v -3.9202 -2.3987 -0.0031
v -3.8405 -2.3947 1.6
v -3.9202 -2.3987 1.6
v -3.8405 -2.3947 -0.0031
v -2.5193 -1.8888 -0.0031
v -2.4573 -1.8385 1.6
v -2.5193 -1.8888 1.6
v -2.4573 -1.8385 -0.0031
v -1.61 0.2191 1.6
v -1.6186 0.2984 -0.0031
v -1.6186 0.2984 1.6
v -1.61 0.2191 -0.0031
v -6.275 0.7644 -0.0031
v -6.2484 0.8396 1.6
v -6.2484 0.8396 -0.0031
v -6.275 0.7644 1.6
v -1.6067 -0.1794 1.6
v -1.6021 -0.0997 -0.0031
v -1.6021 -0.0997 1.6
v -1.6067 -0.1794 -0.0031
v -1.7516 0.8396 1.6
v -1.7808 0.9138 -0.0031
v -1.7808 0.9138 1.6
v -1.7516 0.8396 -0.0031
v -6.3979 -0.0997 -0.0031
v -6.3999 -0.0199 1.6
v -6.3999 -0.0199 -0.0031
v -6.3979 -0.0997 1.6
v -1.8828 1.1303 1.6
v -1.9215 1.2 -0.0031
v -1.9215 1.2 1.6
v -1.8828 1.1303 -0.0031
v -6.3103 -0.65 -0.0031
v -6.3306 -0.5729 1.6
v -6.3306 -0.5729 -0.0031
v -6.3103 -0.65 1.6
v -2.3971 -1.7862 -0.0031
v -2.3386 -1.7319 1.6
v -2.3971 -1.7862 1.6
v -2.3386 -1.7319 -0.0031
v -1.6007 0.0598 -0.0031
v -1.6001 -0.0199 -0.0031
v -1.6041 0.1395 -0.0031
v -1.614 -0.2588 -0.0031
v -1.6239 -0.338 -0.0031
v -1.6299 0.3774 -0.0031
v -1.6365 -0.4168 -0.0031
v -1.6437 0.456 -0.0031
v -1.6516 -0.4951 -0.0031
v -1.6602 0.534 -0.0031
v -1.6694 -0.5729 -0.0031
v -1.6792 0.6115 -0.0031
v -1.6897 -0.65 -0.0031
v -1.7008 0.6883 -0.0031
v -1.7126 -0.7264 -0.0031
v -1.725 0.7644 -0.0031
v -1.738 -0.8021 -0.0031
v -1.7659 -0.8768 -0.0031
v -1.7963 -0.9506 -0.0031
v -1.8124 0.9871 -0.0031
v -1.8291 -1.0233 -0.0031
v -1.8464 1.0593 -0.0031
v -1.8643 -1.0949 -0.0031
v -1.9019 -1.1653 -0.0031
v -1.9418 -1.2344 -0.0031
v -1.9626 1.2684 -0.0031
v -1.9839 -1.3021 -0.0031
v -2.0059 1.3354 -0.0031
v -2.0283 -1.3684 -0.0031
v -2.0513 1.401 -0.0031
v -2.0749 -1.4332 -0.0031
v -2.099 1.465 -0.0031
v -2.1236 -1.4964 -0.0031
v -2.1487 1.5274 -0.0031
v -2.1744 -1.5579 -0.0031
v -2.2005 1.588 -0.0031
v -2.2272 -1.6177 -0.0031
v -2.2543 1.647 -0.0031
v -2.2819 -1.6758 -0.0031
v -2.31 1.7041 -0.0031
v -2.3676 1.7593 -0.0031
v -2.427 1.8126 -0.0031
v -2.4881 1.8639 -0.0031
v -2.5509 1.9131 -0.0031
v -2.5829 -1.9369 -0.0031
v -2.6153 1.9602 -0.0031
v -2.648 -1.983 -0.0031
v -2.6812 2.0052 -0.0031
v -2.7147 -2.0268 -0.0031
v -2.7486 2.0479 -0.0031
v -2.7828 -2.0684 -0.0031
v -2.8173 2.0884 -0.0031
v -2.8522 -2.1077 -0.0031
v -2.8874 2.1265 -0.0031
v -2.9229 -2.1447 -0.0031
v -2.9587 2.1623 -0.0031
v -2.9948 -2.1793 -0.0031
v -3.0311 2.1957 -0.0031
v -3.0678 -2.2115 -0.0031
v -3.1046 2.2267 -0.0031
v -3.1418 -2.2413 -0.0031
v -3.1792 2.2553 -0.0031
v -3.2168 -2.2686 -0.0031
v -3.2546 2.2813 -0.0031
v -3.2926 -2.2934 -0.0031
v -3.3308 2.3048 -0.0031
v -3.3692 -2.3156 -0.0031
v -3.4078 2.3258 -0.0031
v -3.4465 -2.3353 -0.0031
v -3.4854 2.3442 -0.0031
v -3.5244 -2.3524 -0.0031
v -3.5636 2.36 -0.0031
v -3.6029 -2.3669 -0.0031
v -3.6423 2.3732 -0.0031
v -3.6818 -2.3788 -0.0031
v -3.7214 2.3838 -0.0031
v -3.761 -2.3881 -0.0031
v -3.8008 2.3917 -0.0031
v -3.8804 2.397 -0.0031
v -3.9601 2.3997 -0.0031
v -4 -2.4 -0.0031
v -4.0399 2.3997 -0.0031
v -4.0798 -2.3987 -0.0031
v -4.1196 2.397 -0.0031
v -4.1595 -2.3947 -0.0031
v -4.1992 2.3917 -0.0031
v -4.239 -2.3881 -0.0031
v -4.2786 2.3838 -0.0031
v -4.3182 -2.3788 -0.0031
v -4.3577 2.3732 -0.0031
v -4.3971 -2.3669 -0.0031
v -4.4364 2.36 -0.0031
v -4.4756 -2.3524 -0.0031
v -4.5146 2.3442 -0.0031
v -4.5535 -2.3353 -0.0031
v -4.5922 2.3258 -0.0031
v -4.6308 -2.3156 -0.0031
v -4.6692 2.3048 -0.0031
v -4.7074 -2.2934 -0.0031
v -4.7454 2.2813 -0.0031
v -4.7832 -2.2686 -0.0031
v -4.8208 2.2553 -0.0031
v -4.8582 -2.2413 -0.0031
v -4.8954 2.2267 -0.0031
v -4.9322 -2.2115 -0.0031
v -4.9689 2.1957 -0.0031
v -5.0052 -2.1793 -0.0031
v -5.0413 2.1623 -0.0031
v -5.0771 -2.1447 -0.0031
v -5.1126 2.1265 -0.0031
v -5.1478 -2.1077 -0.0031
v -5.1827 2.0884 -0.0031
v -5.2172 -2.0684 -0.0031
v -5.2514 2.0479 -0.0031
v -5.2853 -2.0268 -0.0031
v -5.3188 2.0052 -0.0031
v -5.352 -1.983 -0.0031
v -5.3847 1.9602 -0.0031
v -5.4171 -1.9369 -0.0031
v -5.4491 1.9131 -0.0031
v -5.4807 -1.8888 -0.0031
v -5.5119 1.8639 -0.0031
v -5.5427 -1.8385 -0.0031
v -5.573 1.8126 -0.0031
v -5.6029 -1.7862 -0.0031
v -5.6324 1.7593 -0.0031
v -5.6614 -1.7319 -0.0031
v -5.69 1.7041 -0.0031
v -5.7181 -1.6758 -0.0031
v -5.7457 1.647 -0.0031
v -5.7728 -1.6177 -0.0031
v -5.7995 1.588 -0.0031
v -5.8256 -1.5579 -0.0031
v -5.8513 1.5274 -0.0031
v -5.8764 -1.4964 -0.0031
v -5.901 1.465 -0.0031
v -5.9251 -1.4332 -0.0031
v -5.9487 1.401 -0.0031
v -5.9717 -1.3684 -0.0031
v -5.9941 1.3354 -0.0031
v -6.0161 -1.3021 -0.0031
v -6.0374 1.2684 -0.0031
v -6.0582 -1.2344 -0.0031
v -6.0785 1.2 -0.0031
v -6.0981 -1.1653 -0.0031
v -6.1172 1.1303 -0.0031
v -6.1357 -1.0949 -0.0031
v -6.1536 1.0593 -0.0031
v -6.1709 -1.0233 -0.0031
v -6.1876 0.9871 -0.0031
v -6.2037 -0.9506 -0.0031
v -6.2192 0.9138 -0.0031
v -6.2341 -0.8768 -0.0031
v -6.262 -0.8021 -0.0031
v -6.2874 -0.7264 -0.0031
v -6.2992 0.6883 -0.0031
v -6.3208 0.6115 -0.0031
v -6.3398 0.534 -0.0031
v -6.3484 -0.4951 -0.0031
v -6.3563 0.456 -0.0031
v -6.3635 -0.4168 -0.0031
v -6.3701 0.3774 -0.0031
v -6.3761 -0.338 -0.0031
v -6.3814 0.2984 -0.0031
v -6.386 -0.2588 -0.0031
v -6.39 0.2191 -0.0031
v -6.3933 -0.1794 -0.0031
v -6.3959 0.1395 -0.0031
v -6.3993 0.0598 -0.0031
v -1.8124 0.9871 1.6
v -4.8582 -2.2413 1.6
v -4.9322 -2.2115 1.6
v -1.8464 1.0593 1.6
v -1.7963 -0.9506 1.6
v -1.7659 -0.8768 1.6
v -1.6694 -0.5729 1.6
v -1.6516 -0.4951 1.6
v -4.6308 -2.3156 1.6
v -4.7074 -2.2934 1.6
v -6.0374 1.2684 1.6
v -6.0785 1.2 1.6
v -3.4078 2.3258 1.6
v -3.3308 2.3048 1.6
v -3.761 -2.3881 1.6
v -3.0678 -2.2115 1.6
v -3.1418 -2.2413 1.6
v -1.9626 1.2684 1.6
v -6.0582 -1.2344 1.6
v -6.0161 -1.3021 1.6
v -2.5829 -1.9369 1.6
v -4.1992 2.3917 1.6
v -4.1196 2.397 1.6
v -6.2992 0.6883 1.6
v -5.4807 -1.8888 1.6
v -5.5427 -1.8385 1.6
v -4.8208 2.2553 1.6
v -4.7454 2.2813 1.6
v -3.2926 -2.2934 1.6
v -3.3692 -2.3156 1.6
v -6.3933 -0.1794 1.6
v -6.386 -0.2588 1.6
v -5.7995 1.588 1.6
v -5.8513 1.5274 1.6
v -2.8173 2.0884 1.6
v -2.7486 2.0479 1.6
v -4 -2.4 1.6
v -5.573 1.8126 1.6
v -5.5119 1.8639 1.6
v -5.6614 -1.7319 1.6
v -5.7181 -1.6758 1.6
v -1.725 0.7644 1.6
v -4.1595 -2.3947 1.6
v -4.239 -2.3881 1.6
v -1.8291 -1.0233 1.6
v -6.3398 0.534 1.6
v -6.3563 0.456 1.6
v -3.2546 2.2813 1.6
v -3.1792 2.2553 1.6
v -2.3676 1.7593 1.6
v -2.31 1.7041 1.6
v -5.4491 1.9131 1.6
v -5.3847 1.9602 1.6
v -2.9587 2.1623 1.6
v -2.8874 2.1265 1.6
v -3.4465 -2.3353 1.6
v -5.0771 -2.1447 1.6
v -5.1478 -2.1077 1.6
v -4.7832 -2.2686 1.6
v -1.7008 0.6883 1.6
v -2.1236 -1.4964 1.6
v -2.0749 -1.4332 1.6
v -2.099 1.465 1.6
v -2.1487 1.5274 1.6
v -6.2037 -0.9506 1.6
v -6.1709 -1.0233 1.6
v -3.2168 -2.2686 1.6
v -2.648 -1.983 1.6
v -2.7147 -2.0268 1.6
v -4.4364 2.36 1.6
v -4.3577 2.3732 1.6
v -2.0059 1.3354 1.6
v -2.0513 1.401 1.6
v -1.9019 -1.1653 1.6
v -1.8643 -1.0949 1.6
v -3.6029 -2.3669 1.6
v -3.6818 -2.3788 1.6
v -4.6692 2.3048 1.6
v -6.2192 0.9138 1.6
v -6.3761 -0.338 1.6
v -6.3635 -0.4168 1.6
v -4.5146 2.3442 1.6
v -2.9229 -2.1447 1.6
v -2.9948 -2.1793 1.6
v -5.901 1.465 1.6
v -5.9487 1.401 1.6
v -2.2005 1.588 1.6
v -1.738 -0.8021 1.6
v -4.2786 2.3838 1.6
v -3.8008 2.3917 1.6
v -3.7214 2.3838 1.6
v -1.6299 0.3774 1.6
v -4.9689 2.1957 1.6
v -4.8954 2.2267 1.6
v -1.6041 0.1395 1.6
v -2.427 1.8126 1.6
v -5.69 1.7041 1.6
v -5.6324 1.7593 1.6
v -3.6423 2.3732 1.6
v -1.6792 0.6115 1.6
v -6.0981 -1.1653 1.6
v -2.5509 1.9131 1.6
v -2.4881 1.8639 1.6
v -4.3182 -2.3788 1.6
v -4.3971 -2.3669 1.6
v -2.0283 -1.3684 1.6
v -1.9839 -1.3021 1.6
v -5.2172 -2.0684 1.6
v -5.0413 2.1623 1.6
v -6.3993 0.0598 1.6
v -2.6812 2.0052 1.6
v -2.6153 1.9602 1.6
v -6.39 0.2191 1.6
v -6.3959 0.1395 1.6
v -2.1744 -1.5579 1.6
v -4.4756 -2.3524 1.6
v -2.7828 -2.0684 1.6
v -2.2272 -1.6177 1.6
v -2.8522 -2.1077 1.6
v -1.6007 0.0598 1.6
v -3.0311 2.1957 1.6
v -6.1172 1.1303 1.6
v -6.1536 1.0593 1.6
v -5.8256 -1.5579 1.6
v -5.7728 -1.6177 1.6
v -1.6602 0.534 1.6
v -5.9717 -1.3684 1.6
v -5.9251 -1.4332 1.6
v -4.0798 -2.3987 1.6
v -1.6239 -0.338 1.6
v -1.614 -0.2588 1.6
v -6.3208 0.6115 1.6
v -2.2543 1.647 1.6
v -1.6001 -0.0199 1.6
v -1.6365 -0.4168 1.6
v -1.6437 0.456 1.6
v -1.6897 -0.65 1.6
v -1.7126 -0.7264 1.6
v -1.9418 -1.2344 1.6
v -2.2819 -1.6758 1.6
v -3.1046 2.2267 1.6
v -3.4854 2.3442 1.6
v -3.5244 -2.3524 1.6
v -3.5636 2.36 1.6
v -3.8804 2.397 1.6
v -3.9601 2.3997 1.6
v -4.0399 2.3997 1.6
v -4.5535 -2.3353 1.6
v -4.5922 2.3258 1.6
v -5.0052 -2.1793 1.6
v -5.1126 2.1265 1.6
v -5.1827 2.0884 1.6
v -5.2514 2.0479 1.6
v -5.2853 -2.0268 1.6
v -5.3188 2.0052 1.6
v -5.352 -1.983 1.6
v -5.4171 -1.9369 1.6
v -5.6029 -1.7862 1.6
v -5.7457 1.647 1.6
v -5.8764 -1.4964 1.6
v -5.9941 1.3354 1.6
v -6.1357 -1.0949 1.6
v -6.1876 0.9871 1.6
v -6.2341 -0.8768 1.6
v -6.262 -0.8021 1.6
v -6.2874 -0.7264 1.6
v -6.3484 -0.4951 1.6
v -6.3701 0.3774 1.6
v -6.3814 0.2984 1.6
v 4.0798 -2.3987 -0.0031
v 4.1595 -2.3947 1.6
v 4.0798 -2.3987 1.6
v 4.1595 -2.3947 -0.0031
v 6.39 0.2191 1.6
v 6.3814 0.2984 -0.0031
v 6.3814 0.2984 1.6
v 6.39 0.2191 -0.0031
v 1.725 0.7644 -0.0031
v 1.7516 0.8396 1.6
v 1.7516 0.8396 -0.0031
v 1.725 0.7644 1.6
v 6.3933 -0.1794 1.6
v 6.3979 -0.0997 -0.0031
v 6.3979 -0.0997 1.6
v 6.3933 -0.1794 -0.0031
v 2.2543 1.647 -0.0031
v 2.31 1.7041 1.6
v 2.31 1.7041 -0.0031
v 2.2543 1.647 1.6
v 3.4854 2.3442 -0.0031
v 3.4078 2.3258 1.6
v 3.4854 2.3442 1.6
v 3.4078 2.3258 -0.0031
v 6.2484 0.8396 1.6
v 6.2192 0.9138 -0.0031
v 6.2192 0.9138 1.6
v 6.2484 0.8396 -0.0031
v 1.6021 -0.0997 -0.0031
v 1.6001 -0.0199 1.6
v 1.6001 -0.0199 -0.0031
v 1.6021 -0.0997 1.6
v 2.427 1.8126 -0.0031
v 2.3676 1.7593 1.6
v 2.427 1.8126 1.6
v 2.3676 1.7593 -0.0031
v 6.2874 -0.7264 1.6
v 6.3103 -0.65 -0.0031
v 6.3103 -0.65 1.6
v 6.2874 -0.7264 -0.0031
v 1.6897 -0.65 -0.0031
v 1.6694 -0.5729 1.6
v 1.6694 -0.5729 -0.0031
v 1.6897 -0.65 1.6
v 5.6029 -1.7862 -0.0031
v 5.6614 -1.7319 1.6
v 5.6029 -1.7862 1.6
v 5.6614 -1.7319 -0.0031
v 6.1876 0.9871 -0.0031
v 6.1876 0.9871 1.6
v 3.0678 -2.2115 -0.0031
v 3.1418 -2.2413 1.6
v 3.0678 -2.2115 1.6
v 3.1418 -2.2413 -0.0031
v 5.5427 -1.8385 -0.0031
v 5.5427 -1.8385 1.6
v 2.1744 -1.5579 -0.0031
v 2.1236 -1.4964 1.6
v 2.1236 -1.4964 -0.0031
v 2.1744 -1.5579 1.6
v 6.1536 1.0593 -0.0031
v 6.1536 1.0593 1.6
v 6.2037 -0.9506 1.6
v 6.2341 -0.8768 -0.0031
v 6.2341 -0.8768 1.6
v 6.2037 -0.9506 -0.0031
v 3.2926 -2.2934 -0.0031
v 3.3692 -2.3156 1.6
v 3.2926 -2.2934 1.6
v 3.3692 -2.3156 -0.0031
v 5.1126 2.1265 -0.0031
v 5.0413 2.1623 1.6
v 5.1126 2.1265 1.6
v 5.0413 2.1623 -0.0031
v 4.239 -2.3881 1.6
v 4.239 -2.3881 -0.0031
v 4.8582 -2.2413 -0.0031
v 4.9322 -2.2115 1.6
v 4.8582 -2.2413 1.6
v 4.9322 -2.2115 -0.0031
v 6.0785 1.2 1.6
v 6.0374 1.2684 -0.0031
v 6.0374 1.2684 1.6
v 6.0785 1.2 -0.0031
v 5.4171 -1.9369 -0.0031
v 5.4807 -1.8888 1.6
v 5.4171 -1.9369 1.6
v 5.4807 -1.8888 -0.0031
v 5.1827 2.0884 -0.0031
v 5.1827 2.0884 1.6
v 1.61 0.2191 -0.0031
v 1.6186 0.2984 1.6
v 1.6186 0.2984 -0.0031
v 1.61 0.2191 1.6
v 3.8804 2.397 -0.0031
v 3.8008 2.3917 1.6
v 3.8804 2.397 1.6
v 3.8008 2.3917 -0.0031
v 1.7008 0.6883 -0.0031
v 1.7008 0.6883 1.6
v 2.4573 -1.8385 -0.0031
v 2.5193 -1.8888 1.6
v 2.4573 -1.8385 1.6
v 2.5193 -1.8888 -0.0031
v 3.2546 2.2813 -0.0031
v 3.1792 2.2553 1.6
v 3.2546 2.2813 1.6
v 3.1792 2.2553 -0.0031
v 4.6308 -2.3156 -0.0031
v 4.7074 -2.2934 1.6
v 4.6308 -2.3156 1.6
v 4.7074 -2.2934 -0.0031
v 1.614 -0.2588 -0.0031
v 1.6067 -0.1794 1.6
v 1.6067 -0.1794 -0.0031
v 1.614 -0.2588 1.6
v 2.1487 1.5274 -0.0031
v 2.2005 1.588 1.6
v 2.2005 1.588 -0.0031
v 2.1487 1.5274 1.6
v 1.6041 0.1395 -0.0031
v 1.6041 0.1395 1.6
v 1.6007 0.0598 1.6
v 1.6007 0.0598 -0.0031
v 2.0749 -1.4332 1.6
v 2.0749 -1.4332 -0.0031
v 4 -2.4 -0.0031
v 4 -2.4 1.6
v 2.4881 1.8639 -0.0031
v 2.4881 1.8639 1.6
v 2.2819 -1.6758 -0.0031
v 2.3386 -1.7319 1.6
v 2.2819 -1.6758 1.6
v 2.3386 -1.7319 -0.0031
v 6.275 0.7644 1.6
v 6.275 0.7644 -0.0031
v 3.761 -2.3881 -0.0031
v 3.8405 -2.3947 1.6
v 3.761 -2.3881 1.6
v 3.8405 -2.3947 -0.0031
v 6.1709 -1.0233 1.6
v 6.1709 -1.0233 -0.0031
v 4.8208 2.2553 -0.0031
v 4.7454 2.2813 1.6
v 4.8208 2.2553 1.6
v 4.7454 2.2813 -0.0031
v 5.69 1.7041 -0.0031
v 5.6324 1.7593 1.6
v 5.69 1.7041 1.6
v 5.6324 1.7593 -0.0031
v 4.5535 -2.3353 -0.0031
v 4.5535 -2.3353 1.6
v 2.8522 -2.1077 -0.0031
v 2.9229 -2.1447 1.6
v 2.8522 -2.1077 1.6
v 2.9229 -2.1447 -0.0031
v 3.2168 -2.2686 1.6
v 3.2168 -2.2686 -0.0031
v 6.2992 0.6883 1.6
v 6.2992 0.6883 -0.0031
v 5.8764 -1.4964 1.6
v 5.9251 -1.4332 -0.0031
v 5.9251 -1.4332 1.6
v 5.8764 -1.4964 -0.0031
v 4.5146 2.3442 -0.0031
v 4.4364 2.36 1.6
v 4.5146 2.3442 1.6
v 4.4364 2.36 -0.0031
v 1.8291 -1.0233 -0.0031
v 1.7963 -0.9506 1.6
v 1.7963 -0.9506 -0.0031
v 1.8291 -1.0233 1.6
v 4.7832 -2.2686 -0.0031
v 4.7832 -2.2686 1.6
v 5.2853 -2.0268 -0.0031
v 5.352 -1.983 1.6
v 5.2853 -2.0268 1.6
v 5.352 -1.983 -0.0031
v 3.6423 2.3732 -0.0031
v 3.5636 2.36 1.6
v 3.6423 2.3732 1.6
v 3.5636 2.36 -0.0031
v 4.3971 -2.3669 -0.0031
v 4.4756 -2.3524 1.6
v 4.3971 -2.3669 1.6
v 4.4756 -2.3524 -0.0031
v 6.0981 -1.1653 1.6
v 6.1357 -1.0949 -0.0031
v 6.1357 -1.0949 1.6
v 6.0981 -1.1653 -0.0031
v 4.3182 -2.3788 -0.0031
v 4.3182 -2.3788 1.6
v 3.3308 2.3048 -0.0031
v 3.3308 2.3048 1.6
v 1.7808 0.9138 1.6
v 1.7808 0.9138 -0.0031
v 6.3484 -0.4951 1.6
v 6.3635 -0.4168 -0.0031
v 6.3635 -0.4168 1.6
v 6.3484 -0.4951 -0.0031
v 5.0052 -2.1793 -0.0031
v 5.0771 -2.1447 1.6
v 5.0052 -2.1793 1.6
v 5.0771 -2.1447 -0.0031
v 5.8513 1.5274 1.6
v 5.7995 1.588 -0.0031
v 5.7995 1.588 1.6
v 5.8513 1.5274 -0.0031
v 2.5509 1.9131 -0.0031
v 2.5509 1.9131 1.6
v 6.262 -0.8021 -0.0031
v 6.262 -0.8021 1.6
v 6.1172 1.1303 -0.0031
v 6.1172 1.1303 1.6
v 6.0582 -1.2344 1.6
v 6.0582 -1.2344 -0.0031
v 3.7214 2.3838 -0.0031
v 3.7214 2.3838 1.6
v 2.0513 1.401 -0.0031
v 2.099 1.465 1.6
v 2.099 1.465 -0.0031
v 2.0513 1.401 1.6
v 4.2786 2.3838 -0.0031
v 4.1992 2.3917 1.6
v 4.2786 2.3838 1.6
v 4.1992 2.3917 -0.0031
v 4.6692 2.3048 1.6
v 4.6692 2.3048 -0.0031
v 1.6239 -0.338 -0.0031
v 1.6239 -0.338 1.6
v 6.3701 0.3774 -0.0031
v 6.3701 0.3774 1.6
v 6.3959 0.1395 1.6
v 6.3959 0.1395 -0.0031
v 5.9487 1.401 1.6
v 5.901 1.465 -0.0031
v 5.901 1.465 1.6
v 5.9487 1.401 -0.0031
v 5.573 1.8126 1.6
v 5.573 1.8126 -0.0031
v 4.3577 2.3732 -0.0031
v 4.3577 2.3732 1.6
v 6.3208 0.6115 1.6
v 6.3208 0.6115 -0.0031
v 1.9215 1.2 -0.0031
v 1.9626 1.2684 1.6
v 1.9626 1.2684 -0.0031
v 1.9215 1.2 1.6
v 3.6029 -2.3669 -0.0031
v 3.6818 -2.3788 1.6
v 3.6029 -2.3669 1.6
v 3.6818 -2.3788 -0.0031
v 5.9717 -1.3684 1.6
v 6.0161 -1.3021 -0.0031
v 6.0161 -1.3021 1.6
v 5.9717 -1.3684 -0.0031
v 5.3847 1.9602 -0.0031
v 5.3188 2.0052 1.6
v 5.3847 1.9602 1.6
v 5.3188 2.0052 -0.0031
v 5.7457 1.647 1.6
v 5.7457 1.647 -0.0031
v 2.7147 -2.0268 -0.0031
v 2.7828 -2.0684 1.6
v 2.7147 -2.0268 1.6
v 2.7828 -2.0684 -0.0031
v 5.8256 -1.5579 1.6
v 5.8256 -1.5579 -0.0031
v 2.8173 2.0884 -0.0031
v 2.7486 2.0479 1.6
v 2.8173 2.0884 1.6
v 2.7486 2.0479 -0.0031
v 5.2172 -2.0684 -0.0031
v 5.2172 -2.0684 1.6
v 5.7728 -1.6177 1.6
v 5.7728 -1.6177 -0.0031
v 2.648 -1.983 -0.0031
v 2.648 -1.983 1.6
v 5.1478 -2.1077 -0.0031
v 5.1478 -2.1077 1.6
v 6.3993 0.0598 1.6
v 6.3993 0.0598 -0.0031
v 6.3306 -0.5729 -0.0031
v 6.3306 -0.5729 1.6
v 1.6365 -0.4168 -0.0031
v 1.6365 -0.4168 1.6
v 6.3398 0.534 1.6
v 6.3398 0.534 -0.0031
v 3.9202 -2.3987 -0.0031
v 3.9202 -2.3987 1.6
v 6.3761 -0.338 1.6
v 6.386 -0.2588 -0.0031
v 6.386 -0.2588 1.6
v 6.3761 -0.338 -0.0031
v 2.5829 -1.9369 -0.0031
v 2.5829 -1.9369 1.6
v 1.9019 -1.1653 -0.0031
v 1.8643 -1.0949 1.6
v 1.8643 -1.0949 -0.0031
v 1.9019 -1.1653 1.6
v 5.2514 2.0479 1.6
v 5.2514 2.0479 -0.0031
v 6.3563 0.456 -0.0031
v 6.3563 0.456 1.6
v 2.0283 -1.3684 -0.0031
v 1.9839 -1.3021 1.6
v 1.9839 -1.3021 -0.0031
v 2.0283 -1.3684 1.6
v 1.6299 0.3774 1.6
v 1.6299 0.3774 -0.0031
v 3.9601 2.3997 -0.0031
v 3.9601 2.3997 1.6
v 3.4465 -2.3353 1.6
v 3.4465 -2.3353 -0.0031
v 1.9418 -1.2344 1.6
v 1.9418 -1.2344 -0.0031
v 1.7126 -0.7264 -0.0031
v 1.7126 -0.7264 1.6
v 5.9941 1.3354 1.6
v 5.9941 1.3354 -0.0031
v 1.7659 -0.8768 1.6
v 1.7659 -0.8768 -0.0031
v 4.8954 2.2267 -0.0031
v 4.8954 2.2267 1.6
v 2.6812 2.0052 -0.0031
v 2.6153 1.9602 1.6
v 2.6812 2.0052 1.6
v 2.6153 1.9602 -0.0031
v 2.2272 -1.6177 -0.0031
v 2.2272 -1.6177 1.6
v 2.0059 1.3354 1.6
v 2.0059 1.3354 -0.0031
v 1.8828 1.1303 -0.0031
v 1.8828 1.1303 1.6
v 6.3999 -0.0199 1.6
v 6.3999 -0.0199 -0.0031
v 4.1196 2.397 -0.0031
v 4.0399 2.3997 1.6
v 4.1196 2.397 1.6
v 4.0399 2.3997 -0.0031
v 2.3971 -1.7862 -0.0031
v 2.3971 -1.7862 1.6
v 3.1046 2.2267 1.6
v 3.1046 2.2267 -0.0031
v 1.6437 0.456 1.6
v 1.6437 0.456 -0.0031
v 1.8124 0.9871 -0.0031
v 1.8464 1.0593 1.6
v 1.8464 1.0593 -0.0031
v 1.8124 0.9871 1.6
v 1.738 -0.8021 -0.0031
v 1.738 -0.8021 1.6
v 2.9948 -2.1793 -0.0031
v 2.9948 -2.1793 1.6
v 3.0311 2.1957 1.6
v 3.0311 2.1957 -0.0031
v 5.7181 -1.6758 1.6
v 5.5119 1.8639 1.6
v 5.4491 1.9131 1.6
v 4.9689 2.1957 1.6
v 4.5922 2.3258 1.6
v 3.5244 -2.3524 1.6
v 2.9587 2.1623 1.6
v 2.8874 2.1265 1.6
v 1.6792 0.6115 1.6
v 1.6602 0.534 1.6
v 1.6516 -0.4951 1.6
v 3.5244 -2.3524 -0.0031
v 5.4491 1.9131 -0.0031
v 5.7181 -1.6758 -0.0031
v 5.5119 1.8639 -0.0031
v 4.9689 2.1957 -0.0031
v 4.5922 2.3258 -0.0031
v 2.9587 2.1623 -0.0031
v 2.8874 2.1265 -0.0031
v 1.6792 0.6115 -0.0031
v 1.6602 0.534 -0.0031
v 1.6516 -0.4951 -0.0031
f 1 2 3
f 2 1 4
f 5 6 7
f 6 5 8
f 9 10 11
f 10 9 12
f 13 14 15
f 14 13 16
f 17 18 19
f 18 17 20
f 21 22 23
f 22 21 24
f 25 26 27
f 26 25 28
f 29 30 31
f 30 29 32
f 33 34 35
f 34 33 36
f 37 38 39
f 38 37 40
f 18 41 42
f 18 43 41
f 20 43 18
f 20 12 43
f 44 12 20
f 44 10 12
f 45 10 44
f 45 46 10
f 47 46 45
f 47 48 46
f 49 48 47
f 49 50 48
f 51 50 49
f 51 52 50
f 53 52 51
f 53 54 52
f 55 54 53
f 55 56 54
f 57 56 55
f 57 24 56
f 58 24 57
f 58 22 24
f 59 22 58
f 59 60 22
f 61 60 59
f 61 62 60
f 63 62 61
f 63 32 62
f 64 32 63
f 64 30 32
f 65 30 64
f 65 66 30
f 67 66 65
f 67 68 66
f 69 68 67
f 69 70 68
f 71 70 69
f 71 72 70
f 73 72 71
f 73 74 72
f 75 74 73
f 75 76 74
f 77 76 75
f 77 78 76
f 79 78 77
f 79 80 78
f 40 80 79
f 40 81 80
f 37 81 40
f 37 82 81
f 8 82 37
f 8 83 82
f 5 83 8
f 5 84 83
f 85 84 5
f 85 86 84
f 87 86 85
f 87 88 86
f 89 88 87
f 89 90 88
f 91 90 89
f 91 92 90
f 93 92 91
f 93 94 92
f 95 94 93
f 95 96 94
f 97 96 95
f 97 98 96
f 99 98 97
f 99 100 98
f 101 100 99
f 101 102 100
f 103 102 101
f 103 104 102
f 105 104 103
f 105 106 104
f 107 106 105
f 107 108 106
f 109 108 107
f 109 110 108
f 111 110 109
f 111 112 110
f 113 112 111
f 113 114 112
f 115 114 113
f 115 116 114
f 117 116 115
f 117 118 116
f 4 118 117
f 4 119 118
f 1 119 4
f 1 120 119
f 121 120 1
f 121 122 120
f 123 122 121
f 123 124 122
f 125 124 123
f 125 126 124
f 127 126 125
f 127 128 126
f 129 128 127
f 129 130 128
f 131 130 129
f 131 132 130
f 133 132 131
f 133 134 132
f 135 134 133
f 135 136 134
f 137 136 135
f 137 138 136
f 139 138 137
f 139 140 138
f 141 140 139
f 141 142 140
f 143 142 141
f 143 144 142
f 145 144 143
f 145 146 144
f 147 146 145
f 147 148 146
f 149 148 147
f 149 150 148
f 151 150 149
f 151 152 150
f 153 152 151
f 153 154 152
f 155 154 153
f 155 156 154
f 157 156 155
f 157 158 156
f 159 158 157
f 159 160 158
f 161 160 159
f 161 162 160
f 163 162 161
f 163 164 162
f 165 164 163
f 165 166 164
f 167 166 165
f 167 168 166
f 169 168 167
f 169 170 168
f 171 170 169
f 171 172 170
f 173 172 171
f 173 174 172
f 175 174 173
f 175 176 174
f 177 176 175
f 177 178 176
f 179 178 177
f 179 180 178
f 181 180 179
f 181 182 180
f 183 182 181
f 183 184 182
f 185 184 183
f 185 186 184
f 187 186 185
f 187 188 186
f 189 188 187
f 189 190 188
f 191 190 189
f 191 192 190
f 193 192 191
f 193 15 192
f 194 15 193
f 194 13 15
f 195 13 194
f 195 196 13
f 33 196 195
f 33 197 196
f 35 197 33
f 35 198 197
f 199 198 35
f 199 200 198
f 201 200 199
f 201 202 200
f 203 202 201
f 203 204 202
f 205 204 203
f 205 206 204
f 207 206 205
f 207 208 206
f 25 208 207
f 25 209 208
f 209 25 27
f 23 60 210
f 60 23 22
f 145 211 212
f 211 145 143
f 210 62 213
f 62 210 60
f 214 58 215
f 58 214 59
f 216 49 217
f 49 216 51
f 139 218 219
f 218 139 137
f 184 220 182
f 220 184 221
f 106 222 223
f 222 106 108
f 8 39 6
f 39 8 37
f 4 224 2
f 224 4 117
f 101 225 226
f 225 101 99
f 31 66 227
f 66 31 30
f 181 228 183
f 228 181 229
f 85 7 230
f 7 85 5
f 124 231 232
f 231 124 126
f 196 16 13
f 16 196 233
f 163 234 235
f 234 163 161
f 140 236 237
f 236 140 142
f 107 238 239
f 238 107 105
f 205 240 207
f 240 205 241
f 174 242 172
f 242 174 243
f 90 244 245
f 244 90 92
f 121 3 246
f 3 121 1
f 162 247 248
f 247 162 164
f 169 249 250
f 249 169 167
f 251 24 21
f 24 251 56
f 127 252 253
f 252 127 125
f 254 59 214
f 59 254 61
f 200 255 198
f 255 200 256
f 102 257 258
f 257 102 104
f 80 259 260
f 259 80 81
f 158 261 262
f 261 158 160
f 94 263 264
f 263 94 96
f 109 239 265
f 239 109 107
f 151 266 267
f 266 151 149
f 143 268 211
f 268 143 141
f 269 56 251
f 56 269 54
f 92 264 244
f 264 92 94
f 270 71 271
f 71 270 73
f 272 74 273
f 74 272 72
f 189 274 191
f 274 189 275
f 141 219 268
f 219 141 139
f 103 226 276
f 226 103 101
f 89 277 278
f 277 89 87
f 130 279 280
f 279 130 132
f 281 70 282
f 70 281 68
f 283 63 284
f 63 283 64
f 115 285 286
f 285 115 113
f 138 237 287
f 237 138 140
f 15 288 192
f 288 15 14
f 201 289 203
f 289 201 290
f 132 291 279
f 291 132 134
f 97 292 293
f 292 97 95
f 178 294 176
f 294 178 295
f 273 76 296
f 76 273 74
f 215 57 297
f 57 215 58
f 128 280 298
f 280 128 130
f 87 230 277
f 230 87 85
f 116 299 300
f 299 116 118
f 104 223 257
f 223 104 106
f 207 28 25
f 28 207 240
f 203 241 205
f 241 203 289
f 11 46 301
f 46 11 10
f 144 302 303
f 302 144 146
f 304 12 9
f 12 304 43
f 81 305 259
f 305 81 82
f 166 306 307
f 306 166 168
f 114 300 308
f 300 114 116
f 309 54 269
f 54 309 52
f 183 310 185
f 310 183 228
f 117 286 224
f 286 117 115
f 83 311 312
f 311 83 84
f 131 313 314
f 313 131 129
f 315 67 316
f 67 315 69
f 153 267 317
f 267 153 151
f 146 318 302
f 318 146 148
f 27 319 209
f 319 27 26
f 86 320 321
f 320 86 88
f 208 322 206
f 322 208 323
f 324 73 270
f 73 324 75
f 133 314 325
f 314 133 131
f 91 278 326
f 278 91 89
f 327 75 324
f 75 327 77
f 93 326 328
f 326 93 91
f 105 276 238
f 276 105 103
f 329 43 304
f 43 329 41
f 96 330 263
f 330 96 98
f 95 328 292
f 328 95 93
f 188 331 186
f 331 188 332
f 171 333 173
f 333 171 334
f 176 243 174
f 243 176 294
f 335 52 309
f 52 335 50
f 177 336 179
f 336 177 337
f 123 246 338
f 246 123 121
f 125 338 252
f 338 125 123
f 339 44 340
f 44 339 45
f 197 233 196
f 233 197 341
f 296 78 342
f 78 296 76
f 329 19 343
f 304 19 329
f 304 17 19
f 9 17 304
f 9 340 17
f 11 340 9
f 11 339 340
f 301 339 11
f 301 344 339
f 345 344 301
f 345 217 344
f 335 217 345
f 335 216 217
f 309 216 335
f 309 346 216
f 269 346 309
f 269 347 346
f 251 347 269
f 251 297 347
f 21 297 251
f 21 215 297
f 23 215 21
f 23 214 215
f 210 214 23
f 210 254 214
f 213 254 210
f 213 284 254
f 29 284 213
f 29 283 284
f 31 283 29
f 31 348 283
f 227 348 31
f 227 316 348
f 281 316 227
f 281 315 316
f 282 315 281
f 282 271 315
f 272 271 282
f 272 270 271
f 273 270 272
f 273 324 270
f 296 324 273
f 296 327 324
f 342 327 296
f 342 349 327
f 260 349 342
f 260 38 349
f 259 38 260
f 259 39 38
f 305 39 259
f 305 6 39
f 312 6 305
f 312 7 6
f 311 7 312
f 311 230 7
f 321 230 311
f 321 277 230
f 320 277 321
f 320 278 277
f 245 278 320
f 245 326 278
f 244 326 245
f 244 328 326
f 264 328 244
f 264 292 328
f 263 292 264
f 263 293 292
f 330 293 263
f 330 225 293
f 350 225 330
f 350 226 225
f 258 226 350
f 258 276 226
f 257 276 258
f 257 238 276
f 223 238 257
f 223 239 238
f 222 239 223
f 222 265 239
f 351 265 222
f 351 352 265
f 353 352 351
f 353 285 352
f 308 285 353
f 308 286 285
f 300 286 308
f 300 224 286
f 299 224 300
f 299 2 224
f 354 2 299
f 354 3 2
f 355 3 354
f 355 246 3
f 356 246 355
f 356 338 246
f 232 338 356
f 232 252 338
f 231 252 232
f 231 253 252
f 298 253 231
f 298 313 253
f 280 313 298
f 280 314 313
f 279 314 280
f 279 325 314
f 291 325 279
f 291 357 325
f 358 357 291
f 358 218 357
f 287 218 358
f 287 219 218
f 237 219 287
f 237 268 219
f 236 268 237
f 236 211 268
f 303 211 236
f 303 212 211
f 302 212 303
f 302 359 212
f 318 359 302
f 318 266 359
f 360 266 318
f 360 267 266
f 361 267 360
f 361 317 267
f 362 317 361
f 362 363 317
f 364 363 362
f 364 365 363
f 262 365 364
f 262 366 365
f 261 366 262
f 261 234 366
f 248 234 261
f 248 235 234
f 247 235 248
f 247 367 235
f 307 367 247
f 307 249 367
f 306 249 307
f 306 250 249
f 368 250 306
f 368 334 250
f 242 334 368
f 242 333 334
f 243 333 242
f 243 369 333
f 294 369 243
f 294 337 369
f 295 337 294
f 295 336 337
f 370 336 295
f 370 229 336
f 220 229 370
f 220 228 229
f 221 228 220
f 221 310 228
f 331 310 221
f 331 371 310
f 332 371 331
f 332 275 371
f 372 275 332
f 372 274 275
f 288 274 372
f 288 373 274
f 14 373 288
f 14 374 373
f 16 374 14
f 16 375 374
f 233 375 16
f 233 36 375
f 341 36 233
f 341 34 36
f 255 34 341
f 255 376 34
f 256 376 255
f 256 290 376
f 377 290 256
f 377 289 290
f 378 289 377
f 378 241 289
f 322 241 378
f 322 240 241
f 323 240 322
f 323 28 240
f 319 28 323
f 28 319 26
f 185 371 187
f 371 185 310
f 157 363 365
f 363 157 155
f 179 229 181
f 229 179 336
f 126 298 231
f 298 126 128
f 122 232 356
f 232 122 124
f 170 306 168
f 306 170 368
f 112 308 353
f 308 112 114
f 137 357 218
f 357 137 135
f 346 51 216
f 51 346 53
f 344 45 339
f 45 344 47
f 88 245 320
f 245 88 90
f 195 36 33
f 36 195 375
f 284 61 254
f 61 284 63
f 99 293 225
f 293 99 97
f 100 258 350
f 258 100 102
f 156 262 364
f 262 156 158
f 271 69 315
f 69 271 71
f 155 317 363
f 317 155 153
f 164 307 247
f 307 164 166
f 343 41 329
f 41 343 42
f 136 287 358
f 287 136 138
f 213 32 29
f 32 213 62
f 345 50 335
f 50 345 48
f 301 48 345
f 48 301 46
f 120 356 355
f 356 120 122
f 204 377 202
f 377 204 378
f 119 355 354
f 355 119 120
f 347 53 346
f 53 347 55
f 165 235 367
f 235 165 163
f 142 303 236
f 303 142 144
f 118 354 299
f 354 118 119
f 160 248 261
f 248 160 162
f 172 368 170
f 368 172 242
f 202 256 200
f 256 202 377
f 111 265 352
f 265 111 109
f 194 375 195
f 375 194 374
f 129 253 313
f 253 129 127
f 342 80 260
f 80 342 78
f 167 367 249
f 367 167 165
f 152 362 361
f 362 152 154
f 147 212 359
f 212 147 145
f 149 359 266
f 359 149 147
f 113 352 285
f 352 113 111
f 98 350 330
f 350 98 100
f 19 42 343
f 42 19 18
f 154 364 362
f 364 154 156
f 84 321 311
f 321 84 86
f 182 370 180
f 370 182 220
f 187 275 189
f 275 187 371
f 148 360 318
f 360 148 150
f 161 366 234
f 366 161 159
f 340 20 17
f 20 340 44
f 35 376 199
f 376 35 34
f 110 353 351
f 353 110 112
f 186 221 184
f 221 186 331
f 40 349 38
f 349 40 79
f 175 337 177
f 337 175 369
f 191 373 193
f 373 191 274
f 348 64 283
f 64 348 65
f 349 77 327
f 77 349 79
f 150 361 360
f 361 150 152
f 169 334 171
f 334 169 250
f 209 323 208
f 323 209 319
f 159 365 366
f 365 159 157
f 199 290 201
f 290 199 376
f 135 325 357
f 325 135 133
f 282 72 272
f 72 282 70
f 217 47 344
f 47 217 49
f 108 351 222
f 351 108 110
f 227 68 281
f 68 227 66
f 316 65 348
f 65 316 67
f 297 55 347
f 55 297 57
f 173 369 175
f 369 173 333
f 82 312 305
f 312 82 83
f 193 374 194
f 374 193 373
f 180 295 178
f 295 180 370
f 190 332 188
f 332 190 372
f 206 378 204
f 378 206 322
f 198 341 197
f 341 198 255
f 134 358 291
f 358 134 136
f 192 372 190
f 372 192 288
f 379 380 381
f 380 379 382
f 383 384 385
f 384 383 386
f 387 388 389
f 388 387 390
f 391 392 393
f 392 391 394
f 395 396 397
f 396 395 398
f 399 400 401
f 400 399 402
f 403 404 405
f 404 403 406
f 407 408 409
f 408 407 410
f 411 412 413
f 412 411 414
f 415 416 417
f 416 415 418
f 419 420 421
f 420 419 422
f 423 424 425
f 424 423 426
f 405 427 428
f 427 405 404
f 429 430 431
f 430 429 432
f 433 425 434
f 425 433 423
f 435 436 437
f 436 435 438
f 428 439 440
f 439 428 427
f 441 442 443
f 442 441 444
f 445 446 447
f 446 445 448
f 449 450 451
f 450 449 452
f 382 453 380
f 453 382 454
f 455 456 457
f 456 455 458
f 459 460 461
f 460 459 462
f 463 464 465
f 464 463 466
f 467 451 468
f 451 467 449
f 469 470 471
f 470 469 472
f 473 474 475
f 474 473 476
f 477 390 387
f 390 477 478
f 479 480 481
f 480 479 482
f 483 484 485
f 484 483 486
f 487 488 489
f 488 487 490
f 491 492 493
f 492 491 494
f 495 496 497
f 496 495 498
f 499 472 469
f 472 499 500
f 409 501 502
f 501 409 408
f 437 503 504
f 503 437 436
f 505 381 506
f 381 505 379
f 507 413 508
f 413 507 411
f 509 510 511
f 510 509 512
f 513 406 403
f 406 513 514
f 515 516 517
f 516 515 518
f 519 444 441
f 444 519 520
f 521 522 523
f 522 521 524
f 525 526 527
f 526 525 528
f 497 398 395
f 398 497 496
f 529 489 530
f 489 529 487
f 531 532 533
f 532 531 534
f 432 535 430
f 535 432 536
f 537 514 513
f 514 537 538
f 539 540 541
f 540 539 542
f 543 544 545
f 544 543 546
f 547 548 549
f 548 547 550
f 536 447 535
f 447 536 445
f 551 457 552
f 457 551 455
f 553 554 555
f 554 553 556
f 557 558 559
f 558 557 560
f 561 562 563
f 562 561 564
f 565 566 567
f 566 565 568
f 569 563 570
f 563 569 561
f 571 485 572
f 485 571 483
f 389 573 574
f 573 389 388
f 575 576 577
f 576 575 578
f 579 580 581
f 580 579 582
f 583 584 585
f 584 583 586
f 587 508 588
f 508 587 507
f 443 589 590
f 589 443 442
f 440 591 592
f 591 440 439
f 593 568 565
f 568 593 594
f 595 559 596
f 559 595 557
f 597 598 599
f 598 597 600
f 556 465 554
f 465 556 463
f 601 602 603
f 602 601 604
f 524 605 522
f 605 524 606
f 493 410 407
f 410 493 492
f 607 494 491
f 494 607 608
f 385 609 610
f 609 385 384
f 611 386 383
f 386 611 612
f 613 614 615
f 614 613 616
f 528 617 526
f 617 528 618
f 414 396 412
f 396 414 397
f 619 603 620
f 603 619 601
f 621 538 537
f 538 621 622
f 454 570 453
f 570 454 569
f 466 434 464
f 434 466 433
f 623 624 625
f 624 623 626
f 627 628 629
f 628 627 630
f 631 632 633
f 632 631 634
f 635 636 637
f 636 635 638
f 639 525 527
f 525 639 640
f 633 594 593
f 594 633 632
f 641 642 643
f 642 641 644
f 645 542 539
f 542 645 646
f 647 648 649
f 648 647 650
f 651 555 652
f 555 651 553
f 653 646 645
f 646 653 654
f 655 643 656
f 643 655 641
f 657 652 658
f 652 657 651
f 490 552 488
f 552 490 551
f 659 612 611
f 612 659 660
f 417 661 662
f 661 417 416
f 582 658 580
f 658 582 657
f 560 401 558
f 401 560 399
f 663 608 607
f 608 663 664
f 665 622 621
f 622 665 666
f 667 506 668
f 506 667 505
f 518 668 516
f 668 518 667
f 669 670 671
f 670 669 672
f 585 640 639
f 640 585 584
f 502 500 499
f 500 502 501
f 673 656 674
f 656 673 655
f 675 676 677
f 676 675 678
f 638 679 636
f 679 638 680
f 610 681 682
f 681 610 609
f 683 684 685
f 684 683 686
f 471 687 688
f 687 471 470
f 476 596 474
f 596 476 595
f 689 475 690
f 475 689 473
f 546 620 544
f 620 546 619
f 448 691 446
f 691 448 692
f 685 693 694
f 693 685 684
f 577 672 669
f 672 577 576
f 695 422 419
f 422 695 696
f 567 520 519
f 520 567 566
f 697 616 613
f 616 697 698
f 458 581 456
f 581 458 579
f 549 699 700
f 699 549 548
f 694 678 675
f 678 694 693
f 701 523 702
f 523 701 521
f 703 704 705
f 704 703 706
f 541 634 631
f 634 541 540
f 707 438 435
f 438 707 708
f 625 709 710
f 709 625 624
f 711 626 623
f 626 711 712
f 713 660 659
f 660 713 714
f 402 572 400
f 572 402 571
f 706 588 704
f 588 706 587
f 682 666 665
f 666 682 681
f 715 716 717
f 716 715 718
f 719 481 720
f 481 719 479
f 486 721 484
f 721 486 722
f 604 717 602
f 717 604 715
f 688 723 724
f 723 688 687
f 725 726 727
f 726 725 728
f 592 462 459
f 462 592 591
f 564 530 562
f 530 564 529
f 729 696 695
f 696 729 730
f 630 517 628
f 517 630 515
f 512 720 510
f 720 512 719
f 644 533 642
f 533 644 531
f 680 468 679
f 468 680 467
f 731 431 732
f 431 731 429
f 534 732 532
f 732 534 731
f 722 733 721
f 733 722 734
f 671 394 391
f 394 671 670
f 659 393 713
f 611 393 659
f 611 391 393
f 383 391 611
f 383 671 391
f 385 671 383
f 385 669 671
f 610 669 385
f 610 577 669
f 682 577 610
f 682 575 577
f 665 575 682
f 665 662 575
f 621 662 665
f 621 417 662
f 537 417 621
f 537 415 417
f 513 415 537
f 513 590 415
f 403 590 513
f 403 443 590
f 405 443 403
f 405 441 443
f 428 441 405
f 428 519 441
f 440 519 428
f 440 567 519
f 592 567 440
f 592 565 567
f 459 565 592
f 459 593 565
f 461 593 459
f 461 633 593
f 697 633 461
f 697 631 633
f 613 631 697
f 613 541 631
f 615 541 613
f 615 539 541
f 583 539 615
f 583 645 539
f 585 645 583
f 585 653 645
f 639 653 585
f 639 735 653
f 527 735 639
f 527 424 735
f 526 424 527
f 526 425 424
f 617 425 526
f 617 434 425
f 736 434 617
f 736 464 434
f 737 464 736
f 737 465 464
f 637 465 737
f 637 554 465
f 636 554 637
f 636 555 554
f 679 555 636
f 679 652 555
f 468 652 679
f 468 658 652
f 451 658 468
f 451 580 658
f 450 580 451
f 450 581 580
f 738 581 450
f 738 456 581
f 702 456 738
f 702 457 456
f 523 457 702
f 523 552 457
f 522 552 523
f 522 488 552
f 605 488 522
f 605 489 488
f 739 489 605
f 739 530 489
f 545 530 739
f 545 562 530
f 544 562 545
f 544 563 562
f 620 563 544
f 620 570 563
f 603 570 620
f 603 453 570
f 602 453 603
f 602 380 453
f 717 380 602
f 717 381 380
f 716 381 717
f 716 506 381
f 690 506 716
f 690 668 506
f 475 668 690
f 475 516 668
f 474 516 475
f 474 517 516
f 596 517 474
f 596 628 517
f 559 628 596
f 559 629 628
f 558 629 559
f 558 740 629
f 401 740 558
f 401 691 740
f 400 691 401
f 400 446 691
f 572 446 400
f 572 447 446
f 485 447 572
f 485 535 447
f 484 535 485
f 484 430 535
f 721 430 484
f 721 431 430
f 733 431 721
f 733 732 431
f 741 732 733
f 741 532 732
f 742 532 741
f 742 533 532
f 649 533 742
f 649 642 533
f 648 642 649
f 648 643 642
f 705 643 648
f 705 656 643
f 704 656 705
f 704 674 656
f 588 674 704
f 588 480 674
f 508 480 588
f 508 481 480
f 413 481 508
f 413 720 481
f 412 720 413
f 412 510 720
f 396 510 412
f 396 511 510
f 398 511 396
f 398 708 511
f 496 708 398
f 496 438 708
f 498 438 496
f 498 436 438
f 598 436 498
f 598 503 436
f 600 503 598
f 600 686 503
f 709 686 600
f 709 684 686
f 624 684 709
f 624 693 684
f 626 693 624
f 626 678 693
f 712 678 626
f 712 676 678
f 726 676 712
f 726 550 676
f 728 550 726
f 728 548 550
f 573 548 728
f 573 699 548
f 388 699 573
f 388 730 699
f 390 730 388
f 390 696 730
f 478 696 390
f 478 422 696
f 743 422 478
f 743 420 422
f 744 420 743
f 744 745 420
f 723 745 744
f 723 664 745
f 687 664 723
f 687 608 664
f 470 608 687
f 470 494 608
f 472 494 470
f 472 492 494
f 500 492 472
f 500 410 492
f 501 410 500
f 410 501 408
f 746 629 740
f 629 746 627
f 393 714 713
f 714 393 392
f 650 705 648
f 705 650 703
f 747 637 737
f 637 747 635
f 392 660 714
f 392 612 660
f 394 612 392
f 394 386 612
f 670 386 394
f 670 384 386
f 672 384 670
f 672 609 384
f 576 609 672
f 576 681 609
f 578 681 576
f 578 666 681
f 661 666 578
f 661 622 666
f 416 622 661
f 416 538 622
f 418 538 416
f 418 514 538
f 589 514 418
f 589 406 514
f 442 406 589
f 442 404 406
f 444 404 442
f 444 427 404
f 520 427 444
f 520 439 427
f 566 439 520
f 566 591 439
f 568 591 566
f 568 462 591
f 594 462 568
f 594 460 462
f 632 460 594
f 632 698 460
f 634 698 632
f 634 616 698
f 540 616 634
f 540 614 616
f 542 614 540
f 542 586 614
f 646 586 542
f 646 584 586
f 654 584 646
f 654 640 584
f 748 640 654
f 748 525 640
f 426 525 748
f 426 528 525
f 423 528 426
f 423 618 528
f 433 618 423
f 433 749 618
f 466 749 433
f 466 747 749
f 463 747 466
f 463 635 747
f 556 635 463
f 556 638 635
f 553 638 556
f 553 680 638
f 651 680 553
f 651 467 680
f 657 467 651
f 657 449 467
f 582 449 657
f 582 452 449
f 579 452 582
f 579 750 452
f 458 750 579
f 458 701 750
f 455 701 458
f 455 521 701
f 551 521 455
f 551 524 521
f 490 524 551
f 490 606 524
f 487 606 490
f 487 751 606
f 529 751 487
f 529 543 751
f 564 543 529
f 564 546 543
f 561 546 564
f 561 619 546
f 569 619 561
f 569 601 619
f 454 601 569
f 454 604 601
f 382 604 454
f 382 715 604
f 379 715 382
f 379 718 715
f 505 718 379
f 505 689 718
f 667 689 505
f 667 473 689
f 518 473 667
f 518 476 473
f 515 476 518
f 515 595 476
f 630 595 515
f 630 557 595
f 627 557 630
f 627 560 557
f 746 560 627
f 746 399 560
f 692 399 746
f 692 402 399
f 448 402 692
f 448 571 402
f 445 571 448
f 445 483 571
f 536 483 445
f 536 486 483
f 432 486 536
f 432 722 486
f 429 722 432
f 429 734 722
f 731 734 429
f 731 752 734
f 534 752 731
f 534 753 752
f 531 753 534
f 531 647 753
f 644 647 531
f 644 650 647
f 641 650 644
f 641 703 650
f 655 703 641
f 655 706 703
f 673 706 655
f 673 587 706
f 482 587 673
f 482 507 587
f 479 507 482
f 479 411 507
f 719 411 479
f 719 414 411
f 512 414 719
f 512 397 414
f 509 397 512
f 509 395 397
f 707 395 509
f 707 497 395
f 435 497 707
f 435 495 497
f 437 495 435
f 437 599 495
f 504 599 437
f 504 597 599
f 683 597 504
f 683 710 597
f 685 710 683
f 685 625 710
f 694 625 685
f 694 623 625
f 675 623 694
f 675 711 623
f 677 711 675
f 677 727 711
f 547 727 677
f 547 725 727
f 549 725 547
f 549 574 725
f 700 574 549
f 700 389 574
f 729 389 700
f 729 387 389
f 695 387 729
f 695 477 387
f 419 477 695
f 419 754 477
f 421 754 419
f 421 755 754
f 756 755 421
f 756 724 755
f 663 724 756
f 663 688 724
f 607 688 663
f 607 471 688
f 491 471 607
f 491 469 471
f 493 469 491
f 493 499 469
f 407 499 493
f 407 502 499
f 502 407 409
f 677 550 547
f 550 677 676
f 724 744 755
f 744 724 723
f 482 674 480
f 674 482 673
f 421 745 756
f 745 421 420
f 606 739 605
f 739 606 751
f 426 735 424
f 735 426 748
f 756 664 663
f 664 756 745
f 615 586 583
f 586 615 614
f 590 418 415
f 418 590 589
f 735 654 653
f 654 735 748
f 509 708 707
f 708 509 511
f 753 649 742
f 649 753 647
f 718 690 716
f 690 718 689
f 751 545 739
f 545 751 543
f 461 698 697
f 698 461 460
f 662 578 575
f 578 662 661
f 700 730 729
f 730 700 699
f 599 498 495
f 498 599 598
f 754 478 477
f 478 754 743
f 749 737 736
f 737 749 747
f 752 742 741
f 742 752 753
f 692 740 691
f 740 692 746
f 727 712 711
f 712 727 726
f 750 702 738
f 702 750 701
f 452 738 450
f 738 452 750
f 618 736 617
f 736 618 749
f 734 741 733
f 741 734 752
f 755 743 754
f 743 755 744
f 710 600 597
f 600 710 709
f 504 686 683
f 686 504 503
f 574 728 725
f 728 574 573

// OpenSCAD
use <../lib.scad>
use <s/3039p08s02.scad>
use <s/3039s01.scad>
$fa=1; $fs=0.2;
function ldraw_lib__3039p08(realsolid=false) = [
// 0 Slope Brick 45  2 x  2 with Police Yellow Star Badge Pattern
// 0 Name: 3039p08.dat
// 0 Author: Michael Heidemann [mikeheide]
// 0 !LDRAW_ORG Part UPDATE 2019-01
// 0 !LICENSE Licensed under CC BY 2.0 and CC BY 4.0 : see CAreadme.txt
// 
// 0 BFC CERTIFY CCW
  [0,"BFC","CERTIFY"],
  [0,"BFC","CCW"],
// 
// 0 !HISTORY 2018-04-09 [MagFors] removed one level of subfiles
// 0 !HISTORY 2019-06-28 [PTadmin] Official Update 2019-01
// 
// 
// 1 16 0 0 0 1 0 0 0 1 0 0 0 1 s\3039s01.dat
  [1,16,0,0,0,1,0,0,0,1,0,0,0,1, ldraw_lib__s__3039s01(realsolid)],
// 1 16 0 2.8 -12.8 1 0 0 0 1 -.70711 0 0 .70711 s\3039p08s02.dat
  [1,16,0,2.8,-12.8,1,0,0,0,1,-.70711,0,0,.70711, ldraw_lib__s__3039p08s02(realsolid)],
// 1 16 0 2.8 -12.8 -1 0 0 0 1 -.70711 0 0 .70711 s\3039p08s02.dat
  [1,16,0,2.8,-12.8,-1,0,0,0,1,-.70711,0,0,.70711, ldraw_lib__s__3039p08s02(realsolid)],
// 4 16 -9 2.8 -12.8 9 2.8 -12.8 20 0 -10 -20 0 -10
  [4,16,-9,2.8,-12.8,9,2.8,-12.8,20,0,-10,-20,0,-10],
// 4 16 -9 2.8 -12.8 -20 0 -10 -20 20 -30 -9 18.35642 -28.35642
  [4,16,-9,2.8,-12.8,-20,0,-10,-20,20,-30,-9,18.35642,-28.35642],
// 4 16 9 18.35642 -28.35642 20 20 -30 20 0 -10 9 2.8 -12.8
  [4,16,9,18.35642,-28.35642,20,20,-30,20,0,-10,9,2.8,-12.8],
// 4 16 9 18.35642 -28.35642 -9 18.35642 -28.35642 -20 20 -30 20 20 -30
  [4,16,9,18.35642,-28.35642,-9,18.35642,-28.35642,-20,20,-30,20,20,-30],
];
module ldraw_lib__3039p08(step=0, col=false, unit=2/5, alt=false, line=0.2, solid=!$preview)
    makepoly(ldraw_lib__3039p08(solid), step=step, col=col, unit=unit, alt=alt, line=line, solid=solid);
ldraw_lib__3039p08(line=0.2);
